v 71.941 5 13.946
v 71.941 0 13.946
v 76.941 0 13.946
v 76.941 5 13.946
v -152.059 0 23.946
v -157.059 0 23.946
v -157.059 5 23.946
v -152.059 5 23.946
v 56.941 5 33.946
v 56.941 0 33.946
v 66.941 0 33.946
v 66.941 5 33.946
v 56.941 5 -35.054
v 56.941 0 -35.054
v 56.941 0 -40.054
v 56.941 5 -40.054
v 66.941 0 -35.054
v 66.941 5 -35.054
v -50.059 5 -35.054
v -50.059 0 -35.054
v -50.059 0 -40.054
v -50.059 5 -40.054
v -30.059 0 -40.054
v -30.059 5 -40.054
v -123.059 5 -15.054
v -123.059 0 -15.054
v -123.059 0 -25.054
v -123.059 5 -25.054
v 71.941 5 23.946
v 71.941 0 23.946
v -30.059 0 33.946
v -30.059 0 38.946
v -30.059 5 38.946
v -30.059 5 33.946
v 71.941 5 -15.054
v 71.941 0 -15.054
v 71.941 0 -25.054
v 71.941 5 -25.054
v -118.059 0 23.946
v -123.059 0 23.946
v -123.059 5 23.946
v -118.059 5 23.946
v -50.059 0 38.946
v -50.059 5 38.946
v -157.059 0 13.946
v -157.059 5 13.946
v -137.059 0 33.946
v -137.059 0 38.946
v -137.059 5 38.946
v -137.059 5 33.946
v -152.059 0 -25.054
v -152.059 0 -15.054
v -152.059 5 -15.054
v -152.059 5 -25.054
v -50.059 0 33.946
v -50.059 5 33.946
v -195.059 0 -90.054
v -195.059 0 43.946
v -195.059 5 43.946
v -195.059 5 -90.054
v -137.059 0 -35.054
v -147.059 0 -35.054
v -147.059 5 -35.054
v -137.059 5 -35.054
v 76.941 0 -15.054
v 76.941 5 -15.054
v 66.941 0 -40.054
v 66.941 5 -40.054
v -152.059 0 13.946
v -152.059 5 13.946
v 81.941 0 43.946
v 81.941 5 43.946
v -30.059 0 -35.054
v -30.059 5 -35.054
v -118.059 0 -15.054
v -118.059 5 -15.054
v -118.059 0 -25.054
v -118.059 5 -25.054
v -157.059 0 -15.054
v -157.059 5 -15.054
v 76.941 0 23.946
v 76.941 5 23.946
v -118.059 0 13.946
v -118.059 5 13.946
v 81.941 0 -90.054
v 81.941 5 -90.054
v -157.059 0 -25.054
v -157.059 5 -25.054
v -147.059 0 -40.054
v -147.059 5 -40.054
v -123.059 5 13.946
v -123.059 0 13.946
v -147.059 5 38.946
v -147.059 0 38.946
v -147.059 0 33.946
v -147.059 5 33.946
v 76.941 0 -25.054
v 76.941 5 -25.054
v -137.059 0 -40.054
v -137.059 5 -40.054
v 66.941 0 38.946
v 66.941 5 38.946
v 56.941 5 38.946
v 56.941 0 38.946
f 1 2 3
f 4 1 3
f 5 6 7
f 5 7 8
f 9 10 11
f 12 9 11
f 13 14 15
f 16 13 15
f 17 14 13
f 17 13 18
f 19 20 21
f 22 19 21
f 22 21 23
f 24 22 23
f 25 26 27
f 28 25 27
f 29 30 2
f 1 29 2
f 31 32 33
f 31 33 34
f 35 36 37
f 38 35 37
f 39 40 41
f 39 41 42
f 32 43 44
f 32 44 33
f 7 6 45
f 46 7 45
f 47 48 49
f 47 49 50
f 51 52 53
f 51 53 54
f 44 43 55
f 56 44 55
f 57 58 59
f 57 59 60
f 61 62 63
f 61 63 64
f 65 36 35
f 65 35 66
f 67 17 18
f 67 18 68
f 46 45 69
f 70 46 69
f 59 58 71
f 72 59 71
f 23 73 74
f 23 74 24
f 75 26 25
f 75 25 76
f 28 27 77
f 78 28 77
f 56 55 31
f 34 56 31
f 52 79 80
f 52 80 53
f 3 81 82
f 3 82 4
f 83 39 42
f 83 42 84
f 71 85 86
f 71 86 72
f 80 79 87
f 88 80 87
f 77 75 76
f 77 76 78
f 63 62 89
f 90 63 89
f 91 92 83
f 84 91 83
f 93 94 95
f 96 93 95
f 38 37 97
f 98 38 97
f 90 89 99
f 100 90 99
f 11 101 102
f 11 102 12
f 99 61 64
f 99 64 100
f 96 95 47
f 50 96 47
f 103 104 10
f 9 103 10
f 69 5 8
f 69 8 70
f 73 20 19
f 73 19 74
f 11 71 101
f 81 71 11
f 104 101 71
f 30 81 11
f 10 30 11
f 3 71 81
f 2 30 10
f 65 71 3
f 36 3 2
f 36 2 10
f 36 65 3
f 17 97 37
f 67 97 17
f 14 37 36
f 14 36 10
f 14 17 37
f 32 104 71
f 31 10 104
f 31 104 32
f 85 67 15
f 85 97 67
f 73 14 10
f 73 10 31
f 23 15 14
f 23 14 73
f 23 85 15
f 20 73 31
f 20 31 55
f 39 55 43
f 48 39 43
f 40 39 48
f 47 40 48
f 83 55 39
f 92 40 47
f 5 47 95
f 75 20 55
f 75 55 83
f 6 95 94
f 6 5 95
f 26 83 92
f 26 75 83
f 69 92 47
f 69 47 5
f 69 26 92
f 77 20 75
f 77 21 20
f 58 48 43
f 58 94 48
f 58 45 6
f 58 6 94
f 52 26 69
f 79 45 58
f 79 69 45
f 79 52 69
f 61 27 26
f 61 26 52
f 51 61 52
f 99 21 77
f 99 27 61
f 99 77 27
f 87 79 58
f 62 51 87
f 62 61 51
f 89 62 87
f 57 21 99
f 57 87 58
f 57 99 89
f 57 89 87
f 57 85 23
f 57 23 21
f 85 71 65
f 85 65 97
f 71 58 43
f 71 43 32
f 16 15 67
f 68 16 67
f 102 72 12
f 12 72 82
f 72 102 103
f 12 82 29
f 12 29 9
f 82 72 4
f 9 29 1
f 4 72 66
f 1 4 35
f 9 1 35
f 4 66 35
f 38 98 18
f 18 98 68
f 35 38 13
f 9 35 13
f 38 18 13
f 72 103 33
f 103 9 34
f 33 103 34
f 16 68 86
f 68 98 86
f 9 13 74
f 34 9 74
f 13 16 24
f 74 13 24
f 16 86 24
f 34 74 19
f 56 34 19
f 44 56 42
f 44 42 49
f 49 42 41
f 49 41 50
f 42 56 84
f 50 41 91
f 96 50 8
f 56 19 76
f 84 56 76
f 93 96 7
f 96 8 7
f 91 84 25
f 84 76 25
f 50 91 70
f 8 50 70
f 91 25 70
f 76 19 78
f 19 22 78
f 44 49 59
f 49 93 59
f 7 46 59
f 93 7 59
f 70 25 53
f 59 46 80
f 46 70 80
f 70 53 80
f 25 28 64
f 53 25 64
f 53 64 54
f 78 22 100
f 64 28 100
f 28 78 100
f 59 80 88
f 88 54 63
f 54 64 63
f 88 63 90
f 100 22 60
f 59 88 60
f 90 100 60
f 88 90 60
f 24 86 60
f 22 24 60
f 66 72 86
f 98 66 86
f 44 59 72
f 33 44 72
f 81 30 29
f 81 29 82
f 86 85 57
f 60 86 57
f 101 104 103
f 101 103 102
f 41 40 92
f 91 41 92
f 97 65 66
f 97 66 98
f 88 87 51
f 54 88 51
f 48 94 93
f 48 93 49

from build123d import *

# Parameters (mm, degrees)
SKETCH_1_W      = 10
SKETCH_1_H      = 5
SKETCH_1_W_2    = 20
SKETCH_1_W_3    = 5
SKETCH_1_H_2    = 10
EXTRUDE_1_DEPTH = 5


with BuildPart() as part:
    # 草图1 → 凸台-拉伸1 (new body)
    with BuildSketch(Plane(origin=(0, 0, 0), x_dir=(1, 0, 0), z_dir=(0, 1, 0))):
        Polygon((-195.058737628, 90.053763441), (76.941262372, 90.053763441), (81.941262372, 90.053763441), (81.941262372, -43.946236559), (76.941262372, -43.946236559), (-195.058737628, -43.946236559), align=None)
        with Locations((61.941262372, 37.553763441)):
            Rectangle(SKETCH_1_W, SKETCH_1_H, mode=Mode.SUBTRACT)
        with Locations((-142.058737628, 37.553763441)):
            Rectangle(SKETCH_1_W, SKETCH_1_H, mode=Mode.SUBTRACT)
        with Locations((-142.058737628, -36.446236559)):
            Rectangle(SKETCH_1_W, SKETCH_1_H, mode=Mode.SUBTRACT)
        with Locations((61.941262372, -36.446236559)):
            Rectangle(SKETCH_1_W, SKETCH_1_H, mode=Mode.SUBTRACT)
        with Locations((-40.058737628, 37.553763441)):
            Rectangle(SKETCH_1_W_2, SKETCH_1_H, mode=Mode.SUBTRACT)
        with Locations((-154.558737628, 20.053763441)):
            Rectangle(SKETCH_1_W_3, SKETCH_1_H_2, mode=Mode.SUBTRACT)
        with Locations((-154.558737628, -18.946236559)):
            Rectangle(SKETCH_1_W_3, SKETCH_1_H_2, mode=Mode.SUBTRACT)
        with Locations((74.441262372, 20.053763441)):
            Rectangle(SKETCH_1_W_3, SKETCH_1_H_2, mode=Mode.SUBTRACT)
        with Locations((74.441262372, -18.946236559)):
            Rectangle(SKETCH_1_W_3, SKETCH_1_H_2, mode=Mode.SUBTRACT)
        with Locations((-40.058737628, -36.446236559)):
            Rectangle(SKETCH_1_W_2, SKETCH_1_H, mode=Mode.SUBTRACT)
        with Locations((-120.558737628, 20.053763441)):
            Rectangle(SKETCH_1_W_3, SKETCH_1_H_2, mode=Mode.SUBTRACT)
        with Locations((-120.558737628, -18.946236559)):
            Rectangle(SKETCH_1_W_3, SKETCH_1_H_2, mode=Mode.SUBTRACT)
    extrude(amount=EXTRUDE_1_DEPTH)


solid = part.part
